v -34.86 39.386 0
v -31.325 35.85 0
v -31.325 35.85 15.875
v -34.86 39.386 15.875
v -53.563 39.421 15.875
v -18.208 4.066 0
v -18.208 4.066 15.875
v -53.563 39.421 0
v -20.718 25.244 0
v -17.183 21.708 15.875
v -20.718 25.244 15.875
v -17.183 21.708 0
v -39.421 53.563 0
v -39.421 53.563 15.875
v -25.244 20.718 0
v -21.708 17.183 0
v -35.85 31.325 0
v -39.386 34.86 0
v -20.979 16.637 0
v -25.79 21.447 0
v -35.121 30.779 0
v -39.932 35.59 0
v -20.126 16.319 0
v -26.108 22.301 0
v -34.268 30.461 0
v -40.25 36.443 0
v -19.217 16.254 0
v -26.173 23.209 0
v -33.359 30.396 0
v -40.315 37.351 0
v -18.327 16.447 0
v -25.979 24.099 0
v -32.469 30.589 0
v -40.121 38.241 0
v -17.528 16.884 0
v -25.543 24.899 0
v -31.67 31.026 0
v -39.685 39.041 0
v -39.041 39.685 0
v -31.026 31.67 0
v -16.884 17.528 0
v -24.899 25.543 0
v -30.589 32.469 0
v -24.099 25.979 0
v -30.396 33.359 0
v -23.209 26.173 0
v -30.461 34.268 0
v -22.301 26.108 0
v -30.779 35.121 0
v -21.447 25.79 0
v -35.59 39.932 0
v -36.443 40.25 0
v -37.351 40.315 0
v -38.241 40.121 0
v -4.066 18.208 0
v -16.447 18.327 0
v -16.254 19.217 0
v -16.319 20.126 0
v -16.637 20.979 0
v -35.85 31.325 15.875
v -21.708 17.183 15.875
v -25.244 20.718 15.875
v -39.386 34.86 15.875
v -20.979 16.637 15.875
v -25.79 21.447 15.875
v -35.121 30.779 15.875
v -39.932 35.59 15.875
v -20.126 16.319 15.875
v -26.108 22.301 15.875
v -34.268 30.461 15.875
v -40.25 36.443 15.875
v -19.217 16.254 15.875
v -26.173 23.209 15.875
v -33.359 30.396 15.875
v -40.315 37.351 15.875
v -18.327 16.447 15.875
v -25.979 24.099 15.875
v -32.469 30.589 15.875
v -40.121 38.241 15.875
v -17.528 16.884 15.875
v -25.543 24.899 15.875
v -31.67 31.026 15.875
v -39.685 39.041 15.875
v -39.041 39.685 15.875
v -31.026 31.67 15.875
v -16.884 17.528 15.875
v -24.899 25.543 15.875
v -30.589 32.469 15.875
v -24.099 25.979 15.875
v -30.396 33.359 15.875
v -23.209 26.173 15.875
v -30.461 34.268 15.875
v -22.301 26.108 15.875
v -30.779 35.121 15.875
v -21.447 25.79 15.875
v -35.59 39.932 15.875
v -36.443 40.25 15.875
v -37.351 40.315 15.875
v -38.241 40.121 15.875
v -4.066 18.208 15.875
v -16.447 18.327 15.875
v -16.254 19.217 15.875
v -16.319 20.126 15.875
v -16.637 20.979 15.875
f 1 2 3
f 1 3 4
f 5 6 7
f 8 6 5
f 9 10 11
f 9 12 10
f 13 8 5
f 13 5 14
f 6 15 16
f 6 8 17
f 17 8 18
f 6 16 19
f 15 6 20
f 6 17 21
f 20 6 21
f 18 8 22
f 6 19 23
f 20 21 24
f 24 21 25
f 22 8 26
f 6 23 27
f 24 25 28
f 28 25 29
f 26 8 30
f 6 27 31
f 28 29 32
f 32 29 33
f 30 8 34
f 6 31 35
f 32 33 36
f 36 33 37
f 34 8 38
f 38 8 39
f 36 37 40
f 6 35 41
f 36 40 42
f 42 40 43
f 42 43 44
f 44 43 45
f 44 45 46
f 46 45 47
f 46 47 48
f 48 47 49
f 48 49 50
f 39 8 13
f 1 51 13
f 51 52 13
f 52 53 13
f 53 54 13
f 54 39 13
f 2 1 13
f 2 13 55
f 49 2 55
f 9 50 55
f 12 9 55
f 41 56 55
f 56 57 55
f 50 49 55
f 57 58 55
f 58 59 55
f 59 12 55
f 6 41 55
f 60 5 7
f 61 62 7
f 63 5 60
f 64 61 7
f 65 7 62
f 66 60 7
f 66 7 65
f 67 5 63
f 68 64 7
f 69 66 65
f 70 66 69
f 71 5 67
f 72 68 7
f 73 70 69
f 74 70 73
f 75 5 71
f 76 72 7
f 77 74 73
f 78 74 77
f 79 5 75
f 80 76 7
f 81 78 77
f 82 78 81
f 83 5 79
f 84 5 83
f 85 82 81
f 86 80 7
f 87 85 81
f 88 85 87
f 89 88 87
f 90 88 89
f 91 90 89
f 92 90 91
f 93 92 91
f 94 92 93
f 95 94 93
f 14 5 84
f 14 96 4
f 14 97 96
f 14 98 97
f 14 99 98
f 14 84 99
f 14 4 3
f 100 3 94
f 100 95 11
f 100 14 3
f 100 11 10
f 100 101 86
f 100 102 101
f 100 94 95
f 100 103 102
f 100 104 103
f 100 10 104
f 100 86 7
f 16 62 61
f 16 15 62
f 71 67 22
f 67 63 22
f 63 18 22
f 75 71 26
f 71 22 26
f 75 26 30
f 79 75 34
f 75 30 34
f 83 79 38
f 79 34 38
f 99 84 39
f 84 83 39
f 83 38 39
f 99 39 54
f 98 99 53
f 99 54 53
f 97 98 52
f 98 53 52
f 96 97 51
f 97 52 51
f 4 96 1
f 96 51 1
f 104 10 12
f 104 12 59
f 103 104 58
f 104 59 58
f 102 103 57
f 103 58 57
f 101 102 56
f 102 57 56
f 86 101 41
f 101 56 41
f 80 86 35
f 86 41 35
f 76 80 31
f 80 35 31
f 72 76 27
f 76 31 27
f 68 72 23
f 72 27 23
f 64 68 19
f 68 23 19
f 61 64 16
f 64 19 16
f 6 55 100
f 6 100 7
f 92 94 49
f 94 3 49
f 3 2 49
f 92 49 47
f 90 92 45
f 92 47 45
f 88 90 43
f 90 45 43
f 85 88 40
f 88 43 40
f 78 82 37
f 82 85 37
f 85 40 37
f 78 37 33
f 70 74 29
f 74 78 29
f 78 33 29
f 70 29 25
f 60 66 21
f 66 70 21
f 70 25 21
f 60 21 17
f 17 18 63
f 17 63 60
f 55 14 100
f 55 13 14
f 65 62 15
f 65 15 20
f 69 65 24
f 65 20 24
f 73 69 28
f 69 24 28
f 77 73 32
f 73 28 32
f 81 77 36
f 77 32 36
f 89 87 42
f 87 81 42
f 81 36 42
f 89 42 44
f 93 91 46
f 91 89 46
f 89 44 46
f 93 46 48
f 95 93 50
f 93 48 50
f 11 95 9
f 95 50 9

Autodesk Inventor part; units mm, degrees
ref_plane "YZ Plane" through (0, 0, 0) normal (1, 0, 0) x (0, 1, 0)
ref_plane "XZ Plane" through (0, 0, 0) normal (0, 1, 0) x (-1, 0, 0)
ref_plane "XY Plane" through (0, 0, 0) normal (0, 0, 1) x (1, 0, 0)
sketch "Sketch1" plane through (0, 0, 0) normal (0, 0, 1) x (1, 0, 0)
  line L0 (7.0711, 21.2132) -> (20.3934, 34.5355)
  line L1 (61, 1) -> (41.6066, 20.3934)
  line L2 (61, 1) -> (725, 1)
  line L3 (725, 1) -> (725, 26)
  line L4 (725, 26) -> (720, 31)
  line L5 (720, 31) -> (437.7615, 31)
  arc A0 (434.226, 32.4645) -> (437.7615, 31) centre (437.7615, 36) ccw
  line L6 (434.226, 32.4645) -> (32.4645, 434.226)
  arc A1 (31, 437.7615) -> (32.4645, 434.226) centre (36, 437.7615) ccw
  line L7 (31, 437.7615) -> (31, 720)
  line L8 (31, 720) -> (26, 725)
  line L9 (26, 725) -> (1, 725)
  line L10 (1, 725) -> (1, 61)
  line L11 (20.3934, 41.6066) -> (1, 61)
  arc A2 (20.3934, 34.5355) -> (20.3934, 41.6066) centre (16.8579, 38.0711) ccw
  line L12 (7.0711, 21.2132) -> (20.3934, 34.5355)
  line L13 (21.2132, 7.0711) -> (7.0711, 21.2132)
  line L14 (34.5355, 20.3934) -> (21.2132, 7.0711)
  arc A3 (41.6066, 20.3934) -> (34.5355, 20.3934) centre (38.0711, 16.8579) ccw
  circle A4 centre (15, 600) radius 3.2
  circle A5 centre (200, 15) radius 3.2
  circle A6 centre (600, 15) radius 3.2
  line L15 (252.9319, 164.2611) -> (377.6575, 39.5355)
  arc A7 (374.1219, 31) -> (377.6575, 39.5355) centre (374.1219, 36) ccw
  line L16 (374.1219, 31) -> (82.5685, 31)
  arc A8 (79.033, 32.4645) -> (82.5685, 31) centre (82.5685, 36) ccw
  line L17 (79.033, 32.4645) -> (32.4645, 79.033)
  arc A9 (31, 82.5685) -> (32.4645, 79.033) centre (36, 82.5685) ccw
  line L18 (31, 82.5685) -> (31, 374.1219)
  arc A10 (39.5355, 377.6575) -> (31, 374.1219) centre (36, 374.1219) ccw
  line L19 (39.5355, 377.6575) -> (164.2611, 252.9319)
  arc A11 (162.7002, 244.8028) -> (164.2611, 252.9319) centre (160.7256, 249.3963) ccw
  arc A12 (162.7002, 244.8028) -> (244.8028, 162.7002) centre (187.3833, 187.3833) ccw
  arc A13 (252.9319, 164.2611) -> (244.8028, 162.7002) centre (249.3963, 160.7256) ccw
  circle A14 centre (15, 200) radius 3.2
  line L20 (-61, -1) -> (-41.6066, -20.3934)
  line L21 (-61, -1) -> (-725, -1)
  line L22 (-725, -1) -> (-725, -26)
  line L23 (-725, -26) -> (-720, -31)
  line L24 (-720, -31) -> (-437.7615, -31)
  arc A15 (-434.226, -32.4645) -> (-437.7615, -31) centre (-437.7615, -36) ccw
  line L25 (-434.226, -32.4645) -> (-32.4645, -434.226)
  arc A16 (-31, -437.7615) -> (-32.4645, -434.226) centre (-36, -437.7615) ccw
  line L26 (-31, -437.7615) -> (-31, -720)
  line L27 (-31, -720) -> (-26, -725)
  line L28 (-26, -725) -> (-1, -725)
  line L29 (-1, -725) -> (-1, -61)
  line L30 (-20.3934, -41.6066) -> (-1, -61)
  arc A17 (-20.3934, -34.5355) -> (-20.3934, -41.6066) centre (-16.8579, -38.0711) ccw
  line L31 (-7.0711, -21.2132) -> (-20.3934, -34.5355)
  line L32 (-21.2132, -7.0711) -> (-7.0711, -21.2132)
  line L33 (-34.5355, -20.3934) -> (-21.2132, -7.0711)
  arc A18 (-41.6066, -20.3934) -> (-34.5355, -20.3934) centre (-38.0711, -16.8579) ccw
  circle A19 centre (-15, -600) radius 3.2
  circle A20 centre (-200, -15) radius 3.2
  circle A21 centre (-600, -15) radius 3.2
  line L34 (-252.9319, -164.2611) -> (-377.6575, -39.5355)
  arc A22 (-374.1219, -31) -> (-377.6575, -39.5355) centre (-374.1219, -36) ccw
  line L35 (-374.1219, -31) -> (-82.5685, -31)
  arc A23 (-79.033, -32.4645) -> (-82.5685, -31) centre (-82.5685, -36) ccw
  line L36 (-79.033, -32.4645) -> (-32.4645, -79.033)
  arc A24 (-31, -82.5685) -> (-32.4645, -79.033) centre (-36, -82.5685) ccw
  line L37 (-31, -82.5685) -> (-31, -374.1219)
  arc A25 (-39.5355, -377.6575) -> (-31, -374.1219) centre (-36, -374.1219) ccw
  line L38 (-39.5355, -377.6575) -> (-164.2611, -252.9319)
  arc A26 (-162.7002, -244.8028) -> (-164.2611, -252.9319) centre (-160.7256, -249.3963) ccw
  arc A27 (-162.7002, -244.8028) -> (-244.8028, -162.7002) centre (-187.3833, -187.3833) ccw
  arc A28 (-252.9319, -164.2611) -> (-244.8028, -162.7002) centre (-249.3963, -160.7256) ccw
  circle A29 centre (-15, -200) radius 3.2
  line L39 (-1, 61) -> (-20.3934, 41.6066)
  line L40 (-1, 61) -> (-1, 725)
  line L41 (-1, 725) -> (-26, 725)
  line L42 (-26, 725) -> (-31, 720)
  line L43 (-31, 720) -> (-31, 437.7615)
  arc A30 (-32.4645, 434.226) -> (-31, 437.7615) centre (-36, 437.7615) ccw
  line L44 (-32.4645, 434.226) -> (-434.226, 32.4645)
  arc A31 (-437.7615, 31) -> (-434.226, 32.4645) centre (-437.7615, 36) ccw
  line L45 (-437.7615, 31) -> (-720, 31)
  line L46 (-720, 31) -> (-725, 26)
  line L47 (-725, 26) -> (-725, 1)
  line L48 (-725, 1) -> (-61, 1)
  line L49 (-41.6066, 20.3934) -> (-61, 1)
  arc A32 (-34.5355, 20.3934) -> (-41.6066, 20.3934) centre (-38.0711, 16.8579) ccw
  line L50 (-21.2132, 7.0711) -> (-34.5355, 20.3934)
  line L51 (-7.0711, 21.2132) -> (-21.2132, 7.0711)
  line L52 (-20.3934, 34.5355) -> (-7.0711, 21.2132)
  arc A33 (-20.3934, 41.6066) -> (-20.3934, 34.5355) centre (-16.8579, 38.0711) ccw
  circle A34 centre (-600, 15) radius 3.2
  circle A35 centre (-15, 200) radius 3.2
  circle A36 centre (-15, 600) radius 3.2
  line L53 (-164.2611, 252.9319) -> (-39.5355, 377.6575)
  arc A37 (-31, 374.1219) -> (-39.5355, 377.6575) centre (-36, 374.1219) ccw
  line L54 (-31, 374.1219) -> (-31, 82.5685)
  arc A38 (-32.4645, 79.033) -> (-31, 82.5685) centre (-36, 82.5685) ccw
  line L55 (-32.4645, 79.033) -> (-79.033, 32.4645)
  arc A39 (-82.5685, 31) -> (-79.033, 32.4645) centre (-82.5685, 36) ccw
  line L56 (-82.5685, 31) -> (-374.1219, 31)
  arc A40 (-377.6575, 39.5355) -> (-374.1219, 31) centre (-374.1219, 36) ccw
  line L57 (-377.6575, 39.5355) -> (-252.9319, 164.2611)
  arc A41 (-244.8028, 162.7002) -> (-252.9319, 164.2611) centre (-249.3963, 160.7256) ccw
  arc A42 (-244.8028, 162.7002) -> (-162.7002, 244.8028) centre (-187.3833, 187.3833) ccw
  arc A43 (-164.2611, 252.9319) -> (-162.7002, 244.8028) centre (-160.7256, 249.3963) ccw
  circle A44 centre (-200, 15) radius 3.2
  line L58 (1, -61) -> (20.3934, -41.6066)
  line L59 (1, -61) -> (1, -725)
  line L60 (1, -725) -> (26, -725)
  line L61 (26, -725) -> (31, -720)
  line L62 (31, -720) -> (31, -437.7615)
  arc A45 (32.4645, -434.226) -> (31, -437.7615) centre (36, -437.7615) ccw
  line L63 (32.4645, -434.226) -> (434.226, -32.4645)
  arc A46 (437.7615, -31) -> (434.226, -32.4645) centre (437.7615, -36) ccw
  line L64 (437.7615, -31) -> (720, -31)
  line L65 (720, -31) -> (725, -26)
  line L66 (725, -26) -> (725, -1)
  line L67 (725, -1) -> (61, -1)
  line L68 (41.6066, -20.3934) -> (61, -1)
  arc A47 (34.5355, -20.3934) -> (41.6066, -20.3934) centre (38.0711, -16.8579) ccw
  line L69 (21.2132, -7.0711) -> (34.5355, -20.3934)
  line L70 (7.0711, -21.2132) -> (21.2132, -7.0711)
  line L71 (20.3934, -34.5355) -> (7.0711, -21.2132)
  arc A48 (20.3934, -41.6066) -> (20.3934, -34.5355) centre (16.8579, -38.0711) ccw
  circle A49 centre (600, -15) radius 3.2
  circle A50 centre (15, -200) radius 3.2
  circle A51 centre (15, -600) radius 3.2
  line L72 (164.2611, -252.9319) -> (39.5355, -377.6575)
  arc A52 (31, -374.1219) -> (39.5355, -377.6575) centre (36, -374.1219) ccw
  line L73 (31, -374.1219) -> (31, -82.5685)
  arc A53 (32.4645, -79.033) -> (31, -82.5685) centre (36, -82.5685) ccw
  line L74 (32.4645, -79.033) -> (79.033, -32.4645)
  arc A54 (82.5685, -31) -> (79.033, -32.4645) centre (82.5685, -36) ccw
  line L75 (82.5685, -31) -> (374.1219, -31)
  arc A55 (377.6575, -39.5355) -> (374.1219, -31) centre (374.1219, -36) ccw
  line L76 (377.6575, -39.5355) -> (252.9319, -164.2611)
  arc A56 (244.8028, -162.7002) -> (252.9319, -164.2611) centre (249.3963, -160.7256) ccw
  arc A57 (244.8028, -162.7002) -> (162.7002, -244.8028) centre (187.3833, -187.3833) ccw
  arc A58 (164.2611, -252.9319) -> (162.7002, -244.8028) centre (160.7256, -249.3963) ccw
  circle A59 centre (200, -15) radius 3.2
  line L77 (-8.1812, 19.7495) -> (8.1812, 19.7495)
  line L78 (19.7495, 8.1812) -> (8.1812, 19.7495)
  line L79 (19.7495, 8.1812) -> (19.7495, -8.1812)
  line L80 (13.9654, -13.9654) -> (19.7495, -8.1812)
  line L81 (5.6569, -5.6569) -> (13.9654, -13.9654)
  arc A60 (5.6569, -5.6569) -> (-5.6569, 5.6569) centre (0, 0) ccw
  line L82 (-13.9654, 13.9654) -> (-5.6569, 5.6569)
  line L83 (-8.1812, 19.7495) -> (-13.9654, 13.9654)
  line L84 (8.1812, -19.7495) -> (-8.1812, -19.7495)
  line L85 (-19.7495, -8.1812) -> (-8.1812, -19.7495)
  line L86 (-19.7495, -8.1812) -> (-19.7495, 8.1812)
  line L87 (-13.9654, 13.9654) -> (-19.7495, 8.1812)
  line L88 (-5.6569, 5.6569) -> (-13.9654, 13.9654)
  arc A61 (-5.6569, 5.6569) -> (5.6569, -5.6569) centre (0, 0) ccw
  line L89 (13.9654, -13.9654) -> (5.6569, -5.6569)
  line L90 (8.1812, -19.7495) -> (13.9654, -13.9654)
  line L91 (-4.0659, 18.208) -> (-18.208, 4.0659)
  line L92 (-18.208, 4.0659) -> (-53.5633, 39.4212)
  line L93 (-18.208, 4.0659) -> (31.792, 4.0659) construction
  line L94 (-4.0659, 18.208) -> (-39.4212, 53.5633)
  line L95 (-45.1904, 45.1904) -> (-11.1369, 11.1369) construction
  line L96 (-19.4454, 19.4454) -> (-22.981, 22.981) construction
  line L97 (-17.1827, 21.7082) -> (-20.7182, 25.2437)
  line L98 (-25.2437, 20.7182) -> (-21.7082, 17.1827)
  arc A62 (-21.7082, 17.1827) -> (-17.1827, 21.7082) centre (-19.4454, 19.4454) ccw
  arc A63 (-20.7182, 25.2437) -> (-25.2437, 20.7182) centre (-22.981, 22.981) ccw
  line L99 (-33.5876, 33.5876) -> (-37.1231, 37.1231) construction
  line L100 (-31.3248, 35.8503) -> (-34.8604, 39.3858)
  line L101 (-39.3858, 34.8604) -> (-35.8503, 31.3248)
  arc A64 (-35.8503, 31.3248) -> (-31.3248, 35.8503) centre (-33.5876, 33.5876) ccw
  arc A65 (-34.8604, 39.3858) -> (-39.3858, 34.8604) centre (-37.1231, 37.1231) ccw
  line L102 (-53.5633, 39.4212) -> (-39.4212, 53.5633)
  point P0 (0, 0)
  point P1 (-21.2132, 21.2132)
  point P2 (-35.3553, 35.3553)
extrude "Extrusion2" add sketch "Sketch1" along normal blind 15.875 contours L52 L51 L50 L92 L102 L94 | L94 L77 L83 L87 L86 L92 L51 | L94 L91 L82 L83 L77 | L86 L87 L82 L91 L92
properties part number "Conduit-brace"
